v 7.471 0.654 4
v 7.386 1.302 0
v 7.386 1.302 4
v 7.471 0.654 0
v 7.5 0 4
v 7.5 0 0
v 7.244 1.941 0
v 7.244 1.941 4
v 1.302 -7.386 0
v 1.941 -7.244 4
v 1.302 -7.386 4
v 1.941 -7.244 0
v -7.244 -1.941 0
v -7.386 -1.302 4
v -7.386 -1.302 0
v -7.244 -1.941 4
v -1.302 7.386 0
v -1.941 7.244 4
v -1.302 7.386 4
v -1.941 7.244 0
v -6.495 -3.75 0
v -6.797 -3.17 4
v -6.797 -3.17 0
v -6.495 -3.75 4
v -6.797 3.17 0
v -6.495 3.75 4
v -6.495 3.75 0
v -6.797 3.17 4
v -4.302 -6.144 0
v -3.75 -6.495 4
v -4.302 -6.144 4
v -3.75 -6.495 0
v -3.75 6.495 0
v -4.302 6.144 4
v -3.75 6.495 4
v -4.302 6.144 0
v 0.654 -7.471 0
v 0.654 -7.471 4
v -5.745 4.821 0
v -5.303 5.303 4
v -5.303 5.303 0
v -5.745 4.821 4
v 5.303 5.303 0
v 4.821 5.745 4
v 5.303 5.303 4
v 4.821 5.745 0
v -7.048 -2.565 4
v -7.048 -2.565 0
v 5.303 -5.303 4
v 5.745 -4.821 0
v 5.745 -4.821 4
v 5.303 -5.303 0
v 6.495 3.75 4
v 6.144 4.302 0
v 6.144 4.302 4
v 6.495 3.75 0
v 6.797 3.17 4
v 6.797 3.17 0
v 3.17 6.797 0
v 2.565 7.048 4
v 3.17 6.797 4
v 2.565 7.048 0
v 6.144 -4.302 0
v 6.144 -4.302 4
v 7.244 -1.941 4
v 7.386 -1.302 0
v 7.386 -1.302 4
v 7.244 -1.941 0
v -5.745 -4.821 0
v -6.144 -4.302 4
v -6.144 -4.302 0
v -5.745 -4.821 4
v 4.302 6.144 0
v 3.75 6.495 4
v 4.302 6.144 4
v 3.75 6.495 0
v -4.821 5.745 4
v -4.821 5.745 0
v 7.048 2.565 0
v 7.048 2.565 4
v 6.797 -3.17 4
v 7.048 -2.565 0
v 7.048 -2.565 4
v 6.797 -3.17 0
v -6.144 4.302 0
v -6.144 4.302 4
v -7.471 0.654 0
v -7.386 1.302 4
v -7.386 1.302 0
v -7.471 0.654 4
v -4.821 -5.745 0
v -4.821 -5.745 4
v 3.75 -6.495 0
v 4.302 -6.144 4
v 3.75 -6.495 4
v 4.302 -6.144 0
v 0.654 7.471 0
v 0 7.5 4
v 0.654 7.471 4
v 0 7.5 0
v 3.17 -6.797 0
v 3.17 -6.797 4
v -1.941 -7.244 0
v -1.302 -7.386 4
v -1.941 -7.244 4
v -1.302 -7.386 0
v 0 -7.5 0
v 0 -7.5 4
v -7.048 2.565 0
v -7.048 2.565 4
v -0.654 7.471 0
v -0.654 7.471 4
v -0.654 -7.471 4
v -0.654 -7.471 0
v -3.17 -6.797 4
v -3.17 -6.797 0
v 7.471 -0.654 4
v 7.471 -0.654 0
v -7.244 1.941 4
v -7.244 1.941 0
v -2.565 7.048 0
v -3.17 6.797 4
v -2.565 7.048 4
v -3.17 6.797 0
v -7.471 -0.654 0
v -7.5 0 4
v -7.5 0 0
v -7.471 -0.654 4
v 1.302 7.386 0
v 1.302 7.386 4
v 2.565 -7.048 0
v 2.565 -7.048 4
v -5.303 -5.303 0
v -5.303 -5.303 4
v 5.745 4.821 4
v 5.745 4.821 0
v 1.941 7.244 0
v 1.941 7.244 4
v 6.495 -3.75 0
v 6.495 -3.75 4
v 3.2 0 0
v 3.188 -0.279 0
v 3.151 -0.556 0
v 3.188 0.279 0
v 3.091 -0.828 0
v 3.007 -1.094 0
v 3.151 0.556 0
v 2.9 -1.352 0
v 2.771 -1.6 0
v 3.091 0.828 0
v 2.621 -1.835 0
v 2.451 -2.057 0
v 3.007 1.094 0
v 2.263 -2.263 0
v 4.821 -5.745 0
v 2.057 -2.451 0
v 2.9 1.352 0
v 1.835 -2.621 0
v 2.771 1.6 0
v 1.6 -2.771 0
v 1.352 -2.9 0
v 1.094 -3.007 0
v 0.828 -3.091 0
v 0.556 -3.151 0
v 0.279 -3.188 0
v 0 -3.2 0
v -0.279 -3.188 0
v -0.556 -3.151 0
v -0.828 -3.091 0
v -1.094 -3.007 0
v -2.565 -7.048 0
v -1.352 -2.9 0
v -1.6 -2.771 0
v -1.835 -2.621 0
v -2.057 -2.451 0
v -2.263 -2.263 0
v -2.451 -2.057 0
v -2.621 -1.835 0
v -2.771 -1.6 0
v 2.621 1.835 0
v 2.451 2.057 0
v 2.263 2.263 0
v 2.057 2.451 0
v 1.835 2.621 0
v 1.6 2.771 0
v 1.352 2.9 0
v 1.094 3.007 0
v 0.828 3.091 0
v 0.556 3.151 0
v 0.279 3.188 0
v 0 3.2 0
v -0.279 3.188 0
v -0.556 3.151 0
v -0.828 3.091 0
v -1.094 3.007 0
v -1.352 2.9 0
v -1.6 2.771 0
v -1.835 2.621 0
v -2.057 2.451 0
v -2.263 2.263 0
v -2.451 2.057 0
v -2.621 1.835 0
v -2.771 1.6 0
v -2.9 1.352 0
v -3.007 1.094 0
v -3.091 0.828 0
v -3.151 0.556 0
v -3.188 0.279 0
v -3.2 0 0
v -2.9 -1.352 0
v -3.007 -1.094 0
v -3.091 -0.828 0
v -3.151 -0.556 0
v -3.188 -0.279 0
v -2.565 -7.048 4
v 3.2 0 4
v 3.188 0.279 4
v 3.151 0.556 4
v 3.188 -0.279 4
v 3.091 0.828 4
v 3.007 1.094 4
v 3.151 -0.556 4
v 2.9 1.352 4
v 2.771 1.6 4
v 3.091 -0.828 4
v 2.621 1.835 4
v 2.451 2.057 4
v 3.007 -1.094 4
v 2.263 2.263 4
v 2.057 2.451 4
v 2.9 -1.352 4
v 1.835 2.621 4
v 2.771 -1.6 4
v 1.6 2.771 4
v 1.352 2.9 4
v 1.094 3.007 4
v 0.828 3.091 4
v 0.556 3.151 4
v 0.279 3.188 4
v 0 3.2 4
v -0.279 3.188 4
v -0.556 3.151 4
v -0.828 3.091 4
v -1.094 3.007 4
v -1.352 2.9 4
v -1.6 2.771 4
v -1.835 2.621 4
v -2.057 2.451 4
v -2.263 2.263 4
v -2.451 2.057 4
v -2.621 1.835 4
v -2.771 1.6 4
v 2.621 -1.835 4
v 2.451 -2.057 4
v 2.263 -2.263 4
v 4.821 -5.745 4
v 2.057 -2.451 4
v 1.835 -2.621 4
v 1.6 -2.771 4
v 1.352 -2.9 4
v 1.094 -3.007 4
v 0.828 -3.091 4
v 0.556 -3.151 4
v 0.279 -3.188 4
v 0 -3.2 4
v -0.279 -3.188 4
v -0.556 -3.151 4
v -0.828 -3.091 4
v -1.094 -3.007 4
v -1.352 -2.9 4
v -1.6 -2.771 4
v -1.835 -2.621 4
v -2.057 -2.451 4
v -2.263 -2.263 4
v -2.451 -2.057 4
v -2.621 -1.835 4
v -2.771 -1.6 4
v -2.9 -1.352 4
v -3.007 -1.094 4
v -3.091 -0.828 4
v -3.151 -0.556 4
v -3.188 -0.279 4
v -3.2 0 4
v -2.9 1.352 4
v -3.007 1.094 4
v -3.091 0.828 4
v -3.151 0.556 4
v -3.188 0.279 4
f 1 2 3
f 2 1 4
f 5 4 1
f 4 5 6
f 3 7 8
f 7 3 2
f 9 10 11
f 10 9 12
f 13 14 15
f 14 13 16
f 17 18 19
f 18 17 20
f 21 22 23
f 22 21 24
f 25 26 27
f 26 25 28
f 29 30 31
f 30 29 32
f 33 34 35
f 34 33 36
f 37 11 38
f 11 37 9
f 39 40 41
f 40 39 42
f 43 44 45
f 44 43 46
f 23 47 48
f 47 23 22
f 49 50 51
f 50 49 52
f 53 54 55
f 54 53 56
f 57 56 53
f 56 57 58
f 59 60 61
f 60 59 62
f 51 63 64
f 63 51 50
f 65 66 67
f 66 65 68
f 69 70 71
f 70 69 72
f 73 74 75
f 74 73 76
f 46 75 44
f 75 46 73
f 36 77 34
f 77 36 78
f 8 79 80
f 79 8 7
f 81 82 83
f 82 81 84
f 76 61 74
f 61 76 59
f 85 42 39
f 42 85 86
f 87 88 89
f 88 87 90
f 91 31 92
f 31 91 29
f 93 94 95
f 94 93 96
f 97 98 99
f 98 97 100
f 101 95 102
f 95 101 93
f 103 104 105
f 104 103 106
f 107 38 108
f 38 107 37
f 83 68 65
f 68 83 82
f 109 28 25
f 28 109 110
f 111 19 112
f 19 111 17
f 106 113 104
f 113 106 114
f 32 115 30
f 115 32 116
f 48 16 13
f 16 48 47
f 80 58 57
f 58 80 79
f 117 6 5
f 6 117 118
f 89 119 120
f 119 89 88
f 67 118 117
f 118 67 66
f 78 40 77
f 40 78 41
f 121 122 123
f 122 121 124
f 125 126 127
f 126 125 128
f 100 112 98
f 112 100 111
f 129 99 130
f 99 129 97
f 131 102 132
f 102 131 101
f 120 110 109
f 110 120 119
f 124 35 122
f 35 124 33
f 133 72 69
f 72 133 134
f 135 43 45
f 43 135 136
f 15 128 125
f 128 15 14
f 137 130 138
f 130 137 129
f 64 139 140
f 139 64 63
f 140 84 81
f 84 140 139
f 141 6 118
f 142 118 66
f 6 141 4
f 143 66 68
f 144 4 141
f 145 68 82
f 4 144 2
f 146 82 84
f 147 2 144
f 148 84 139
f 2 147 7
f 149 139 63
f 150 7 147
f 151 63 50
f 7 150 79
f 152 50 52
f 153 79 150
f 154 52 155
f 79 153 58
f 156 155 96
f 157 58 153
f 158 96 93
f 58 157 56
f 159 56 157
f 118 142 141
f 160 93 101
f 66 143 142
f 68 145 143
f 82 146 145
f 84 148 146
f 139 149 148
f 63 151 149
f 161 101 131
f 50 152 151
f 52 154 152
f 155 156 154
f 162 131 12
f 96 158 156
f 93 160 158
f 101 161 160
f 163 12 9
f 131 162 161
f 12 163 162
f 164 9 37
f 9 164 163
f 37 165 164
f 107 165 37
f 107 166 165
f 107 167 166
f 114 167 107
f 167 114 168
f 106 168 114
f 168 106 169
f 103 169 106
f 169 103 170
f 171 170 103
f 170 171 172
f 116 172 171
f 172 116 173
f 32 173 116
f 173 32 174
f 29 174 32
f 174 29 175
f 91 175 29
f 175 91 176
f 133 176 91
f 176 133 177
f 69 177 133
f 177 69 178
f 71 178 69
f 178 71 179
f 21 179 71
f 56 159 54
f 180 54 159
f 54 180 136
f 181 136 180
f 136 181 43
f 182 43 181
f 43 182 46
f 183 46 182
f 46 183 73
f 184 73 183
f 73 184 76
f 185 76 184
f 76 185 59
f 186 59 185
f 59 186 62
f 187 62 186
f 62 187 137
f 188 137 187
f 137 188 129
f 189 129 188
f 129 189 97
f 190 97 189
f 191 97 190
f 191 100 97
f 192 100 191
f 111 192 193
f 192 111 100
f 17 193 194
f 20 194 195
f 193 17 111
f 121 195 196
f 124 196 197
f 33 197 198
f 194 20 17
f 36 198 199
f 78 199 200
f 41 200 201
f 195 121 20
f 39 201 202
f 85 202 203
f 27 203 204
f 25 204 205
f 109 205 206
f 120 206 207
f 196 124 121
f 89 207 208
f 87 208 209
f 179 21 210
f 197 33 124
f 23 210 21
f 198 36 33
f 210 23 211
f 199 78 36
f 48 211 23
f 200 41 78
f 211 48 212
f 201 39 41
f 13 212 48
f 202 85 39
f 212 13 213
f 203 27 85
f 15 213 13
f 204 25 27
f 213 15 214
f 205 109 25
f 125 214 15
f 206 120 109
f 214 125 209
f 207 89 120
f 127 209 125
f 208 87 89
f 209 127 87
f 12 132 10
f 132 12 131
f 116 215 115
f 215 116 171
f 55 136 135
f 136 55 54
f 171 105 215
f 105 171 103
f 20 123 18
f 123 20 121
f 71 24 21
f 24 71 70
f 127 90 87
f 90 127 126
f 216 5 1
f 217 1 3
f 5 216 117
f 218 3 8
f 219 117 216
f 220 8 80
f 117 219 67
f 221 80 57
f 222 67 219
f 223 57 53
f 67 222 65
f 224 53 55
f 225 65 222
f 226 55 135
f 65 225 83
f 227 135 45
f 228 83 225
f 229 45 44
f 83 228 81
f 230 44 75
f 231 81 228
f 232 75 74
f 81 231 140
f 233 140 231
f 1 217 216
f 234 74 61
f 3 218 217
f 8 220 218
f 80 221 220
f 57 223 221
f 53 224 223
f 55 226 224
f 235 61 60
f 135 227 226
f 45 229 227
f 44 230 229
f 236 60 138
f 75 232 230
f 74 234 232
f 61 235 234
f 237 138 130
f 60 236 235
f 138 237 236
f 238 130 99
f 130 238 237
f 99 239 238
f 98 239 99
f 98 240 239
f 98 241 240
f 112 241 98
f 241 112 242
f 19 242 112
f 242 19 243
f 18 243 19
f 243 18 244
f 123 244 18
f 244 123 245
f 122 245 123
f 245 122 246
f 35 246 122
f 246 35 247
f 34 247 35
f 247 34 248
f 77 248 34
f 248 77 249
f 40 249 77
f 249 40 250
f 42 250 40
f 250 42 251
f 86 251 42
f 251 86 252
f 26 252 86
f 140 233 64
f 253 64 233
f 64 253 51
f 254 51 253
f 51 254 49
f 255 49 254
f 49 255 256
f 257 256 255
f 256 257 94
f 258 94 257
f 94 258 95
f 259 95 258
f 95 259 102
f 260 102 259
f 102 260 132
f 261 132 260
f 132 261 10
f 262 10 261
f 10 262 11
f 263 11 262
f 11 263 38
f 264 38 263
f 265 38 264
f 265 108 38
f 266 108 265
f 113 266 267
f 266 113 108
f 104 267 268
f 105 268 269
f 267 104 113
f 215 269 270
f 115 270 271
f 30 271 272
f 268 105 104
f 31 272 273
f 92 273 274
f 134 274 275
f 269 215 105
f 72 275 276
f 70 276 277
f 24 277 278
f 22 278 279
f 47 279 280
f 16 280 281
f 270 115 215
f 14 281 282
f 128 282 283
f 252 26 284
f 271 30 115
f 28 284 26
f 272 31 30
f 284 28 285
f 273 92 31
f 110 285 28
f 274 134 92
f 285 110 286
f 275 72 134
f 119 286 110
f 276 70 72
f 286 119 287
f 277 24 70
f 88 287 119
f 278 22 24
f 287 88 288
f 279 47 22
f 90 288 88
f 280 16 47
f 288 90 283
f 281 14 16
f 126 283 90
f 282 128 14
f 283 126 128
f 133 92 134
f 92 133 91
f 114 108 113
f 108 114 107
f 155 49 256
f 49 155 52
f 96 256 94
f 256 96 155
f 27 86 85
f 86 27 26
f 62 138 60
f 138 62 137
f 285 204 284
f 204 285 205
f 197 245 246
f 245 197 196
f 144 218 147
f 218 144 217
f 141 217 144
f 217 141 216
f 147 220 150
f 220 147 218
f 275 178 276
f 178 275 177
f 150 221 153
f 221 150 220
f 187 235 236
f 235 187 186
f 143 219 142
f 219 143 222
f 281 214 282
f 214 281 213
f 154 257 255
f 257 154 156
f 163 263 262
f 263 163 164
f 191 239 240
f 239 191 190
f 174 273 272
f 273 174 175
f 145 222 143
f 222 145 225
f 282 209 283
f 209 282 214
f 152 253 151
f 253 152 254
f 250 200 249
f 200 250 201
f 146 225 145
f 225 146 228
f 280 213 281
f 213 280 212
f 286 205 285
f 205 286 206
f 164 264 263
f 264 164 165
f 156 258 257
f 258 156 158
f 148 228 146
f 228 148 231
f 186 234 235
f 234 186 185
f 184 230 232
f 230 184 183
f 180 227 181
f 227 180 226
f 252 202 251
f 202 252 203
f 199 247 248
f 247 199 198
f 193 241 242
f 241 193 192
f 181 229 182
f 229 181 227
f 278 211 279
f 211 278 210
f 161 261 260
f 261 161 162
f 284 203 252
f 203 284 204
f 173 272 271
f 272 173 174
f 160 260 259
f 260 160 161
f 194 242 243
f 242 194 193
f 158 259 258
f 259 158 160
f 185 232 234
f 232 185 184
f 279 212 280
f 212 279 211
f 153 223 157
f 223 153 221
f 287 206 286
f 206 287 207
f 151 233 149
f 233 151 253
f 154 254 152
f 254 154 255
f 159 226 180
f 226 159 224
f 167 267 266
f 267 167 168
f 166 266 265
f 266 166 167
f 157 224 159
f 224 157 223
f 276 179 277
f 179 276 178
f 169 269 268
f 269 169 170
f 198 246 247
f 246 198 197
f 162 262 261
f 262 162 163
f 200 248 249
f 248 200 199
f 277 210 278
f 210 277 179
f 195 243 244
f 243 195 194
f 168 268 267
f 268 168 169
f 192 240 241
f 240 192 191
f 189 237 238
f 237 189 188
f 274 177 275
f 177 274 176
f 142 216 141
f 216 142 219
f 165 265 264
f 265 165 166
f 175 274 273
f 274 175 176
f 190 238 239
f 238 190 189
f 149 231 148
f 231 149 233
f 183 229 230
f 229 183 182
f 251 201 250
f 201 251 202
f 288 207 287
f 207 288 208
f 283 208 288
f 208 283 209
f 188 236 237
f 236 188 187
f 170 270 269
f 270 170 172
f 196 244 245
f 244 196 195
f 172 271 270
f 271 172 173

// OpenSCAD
$fn=72;

h=4;
d=15;
ds=6.4;

difference()
{
     cylinder(h=h, d=d);
     cylinder(h=h, d=ds);
    
}
